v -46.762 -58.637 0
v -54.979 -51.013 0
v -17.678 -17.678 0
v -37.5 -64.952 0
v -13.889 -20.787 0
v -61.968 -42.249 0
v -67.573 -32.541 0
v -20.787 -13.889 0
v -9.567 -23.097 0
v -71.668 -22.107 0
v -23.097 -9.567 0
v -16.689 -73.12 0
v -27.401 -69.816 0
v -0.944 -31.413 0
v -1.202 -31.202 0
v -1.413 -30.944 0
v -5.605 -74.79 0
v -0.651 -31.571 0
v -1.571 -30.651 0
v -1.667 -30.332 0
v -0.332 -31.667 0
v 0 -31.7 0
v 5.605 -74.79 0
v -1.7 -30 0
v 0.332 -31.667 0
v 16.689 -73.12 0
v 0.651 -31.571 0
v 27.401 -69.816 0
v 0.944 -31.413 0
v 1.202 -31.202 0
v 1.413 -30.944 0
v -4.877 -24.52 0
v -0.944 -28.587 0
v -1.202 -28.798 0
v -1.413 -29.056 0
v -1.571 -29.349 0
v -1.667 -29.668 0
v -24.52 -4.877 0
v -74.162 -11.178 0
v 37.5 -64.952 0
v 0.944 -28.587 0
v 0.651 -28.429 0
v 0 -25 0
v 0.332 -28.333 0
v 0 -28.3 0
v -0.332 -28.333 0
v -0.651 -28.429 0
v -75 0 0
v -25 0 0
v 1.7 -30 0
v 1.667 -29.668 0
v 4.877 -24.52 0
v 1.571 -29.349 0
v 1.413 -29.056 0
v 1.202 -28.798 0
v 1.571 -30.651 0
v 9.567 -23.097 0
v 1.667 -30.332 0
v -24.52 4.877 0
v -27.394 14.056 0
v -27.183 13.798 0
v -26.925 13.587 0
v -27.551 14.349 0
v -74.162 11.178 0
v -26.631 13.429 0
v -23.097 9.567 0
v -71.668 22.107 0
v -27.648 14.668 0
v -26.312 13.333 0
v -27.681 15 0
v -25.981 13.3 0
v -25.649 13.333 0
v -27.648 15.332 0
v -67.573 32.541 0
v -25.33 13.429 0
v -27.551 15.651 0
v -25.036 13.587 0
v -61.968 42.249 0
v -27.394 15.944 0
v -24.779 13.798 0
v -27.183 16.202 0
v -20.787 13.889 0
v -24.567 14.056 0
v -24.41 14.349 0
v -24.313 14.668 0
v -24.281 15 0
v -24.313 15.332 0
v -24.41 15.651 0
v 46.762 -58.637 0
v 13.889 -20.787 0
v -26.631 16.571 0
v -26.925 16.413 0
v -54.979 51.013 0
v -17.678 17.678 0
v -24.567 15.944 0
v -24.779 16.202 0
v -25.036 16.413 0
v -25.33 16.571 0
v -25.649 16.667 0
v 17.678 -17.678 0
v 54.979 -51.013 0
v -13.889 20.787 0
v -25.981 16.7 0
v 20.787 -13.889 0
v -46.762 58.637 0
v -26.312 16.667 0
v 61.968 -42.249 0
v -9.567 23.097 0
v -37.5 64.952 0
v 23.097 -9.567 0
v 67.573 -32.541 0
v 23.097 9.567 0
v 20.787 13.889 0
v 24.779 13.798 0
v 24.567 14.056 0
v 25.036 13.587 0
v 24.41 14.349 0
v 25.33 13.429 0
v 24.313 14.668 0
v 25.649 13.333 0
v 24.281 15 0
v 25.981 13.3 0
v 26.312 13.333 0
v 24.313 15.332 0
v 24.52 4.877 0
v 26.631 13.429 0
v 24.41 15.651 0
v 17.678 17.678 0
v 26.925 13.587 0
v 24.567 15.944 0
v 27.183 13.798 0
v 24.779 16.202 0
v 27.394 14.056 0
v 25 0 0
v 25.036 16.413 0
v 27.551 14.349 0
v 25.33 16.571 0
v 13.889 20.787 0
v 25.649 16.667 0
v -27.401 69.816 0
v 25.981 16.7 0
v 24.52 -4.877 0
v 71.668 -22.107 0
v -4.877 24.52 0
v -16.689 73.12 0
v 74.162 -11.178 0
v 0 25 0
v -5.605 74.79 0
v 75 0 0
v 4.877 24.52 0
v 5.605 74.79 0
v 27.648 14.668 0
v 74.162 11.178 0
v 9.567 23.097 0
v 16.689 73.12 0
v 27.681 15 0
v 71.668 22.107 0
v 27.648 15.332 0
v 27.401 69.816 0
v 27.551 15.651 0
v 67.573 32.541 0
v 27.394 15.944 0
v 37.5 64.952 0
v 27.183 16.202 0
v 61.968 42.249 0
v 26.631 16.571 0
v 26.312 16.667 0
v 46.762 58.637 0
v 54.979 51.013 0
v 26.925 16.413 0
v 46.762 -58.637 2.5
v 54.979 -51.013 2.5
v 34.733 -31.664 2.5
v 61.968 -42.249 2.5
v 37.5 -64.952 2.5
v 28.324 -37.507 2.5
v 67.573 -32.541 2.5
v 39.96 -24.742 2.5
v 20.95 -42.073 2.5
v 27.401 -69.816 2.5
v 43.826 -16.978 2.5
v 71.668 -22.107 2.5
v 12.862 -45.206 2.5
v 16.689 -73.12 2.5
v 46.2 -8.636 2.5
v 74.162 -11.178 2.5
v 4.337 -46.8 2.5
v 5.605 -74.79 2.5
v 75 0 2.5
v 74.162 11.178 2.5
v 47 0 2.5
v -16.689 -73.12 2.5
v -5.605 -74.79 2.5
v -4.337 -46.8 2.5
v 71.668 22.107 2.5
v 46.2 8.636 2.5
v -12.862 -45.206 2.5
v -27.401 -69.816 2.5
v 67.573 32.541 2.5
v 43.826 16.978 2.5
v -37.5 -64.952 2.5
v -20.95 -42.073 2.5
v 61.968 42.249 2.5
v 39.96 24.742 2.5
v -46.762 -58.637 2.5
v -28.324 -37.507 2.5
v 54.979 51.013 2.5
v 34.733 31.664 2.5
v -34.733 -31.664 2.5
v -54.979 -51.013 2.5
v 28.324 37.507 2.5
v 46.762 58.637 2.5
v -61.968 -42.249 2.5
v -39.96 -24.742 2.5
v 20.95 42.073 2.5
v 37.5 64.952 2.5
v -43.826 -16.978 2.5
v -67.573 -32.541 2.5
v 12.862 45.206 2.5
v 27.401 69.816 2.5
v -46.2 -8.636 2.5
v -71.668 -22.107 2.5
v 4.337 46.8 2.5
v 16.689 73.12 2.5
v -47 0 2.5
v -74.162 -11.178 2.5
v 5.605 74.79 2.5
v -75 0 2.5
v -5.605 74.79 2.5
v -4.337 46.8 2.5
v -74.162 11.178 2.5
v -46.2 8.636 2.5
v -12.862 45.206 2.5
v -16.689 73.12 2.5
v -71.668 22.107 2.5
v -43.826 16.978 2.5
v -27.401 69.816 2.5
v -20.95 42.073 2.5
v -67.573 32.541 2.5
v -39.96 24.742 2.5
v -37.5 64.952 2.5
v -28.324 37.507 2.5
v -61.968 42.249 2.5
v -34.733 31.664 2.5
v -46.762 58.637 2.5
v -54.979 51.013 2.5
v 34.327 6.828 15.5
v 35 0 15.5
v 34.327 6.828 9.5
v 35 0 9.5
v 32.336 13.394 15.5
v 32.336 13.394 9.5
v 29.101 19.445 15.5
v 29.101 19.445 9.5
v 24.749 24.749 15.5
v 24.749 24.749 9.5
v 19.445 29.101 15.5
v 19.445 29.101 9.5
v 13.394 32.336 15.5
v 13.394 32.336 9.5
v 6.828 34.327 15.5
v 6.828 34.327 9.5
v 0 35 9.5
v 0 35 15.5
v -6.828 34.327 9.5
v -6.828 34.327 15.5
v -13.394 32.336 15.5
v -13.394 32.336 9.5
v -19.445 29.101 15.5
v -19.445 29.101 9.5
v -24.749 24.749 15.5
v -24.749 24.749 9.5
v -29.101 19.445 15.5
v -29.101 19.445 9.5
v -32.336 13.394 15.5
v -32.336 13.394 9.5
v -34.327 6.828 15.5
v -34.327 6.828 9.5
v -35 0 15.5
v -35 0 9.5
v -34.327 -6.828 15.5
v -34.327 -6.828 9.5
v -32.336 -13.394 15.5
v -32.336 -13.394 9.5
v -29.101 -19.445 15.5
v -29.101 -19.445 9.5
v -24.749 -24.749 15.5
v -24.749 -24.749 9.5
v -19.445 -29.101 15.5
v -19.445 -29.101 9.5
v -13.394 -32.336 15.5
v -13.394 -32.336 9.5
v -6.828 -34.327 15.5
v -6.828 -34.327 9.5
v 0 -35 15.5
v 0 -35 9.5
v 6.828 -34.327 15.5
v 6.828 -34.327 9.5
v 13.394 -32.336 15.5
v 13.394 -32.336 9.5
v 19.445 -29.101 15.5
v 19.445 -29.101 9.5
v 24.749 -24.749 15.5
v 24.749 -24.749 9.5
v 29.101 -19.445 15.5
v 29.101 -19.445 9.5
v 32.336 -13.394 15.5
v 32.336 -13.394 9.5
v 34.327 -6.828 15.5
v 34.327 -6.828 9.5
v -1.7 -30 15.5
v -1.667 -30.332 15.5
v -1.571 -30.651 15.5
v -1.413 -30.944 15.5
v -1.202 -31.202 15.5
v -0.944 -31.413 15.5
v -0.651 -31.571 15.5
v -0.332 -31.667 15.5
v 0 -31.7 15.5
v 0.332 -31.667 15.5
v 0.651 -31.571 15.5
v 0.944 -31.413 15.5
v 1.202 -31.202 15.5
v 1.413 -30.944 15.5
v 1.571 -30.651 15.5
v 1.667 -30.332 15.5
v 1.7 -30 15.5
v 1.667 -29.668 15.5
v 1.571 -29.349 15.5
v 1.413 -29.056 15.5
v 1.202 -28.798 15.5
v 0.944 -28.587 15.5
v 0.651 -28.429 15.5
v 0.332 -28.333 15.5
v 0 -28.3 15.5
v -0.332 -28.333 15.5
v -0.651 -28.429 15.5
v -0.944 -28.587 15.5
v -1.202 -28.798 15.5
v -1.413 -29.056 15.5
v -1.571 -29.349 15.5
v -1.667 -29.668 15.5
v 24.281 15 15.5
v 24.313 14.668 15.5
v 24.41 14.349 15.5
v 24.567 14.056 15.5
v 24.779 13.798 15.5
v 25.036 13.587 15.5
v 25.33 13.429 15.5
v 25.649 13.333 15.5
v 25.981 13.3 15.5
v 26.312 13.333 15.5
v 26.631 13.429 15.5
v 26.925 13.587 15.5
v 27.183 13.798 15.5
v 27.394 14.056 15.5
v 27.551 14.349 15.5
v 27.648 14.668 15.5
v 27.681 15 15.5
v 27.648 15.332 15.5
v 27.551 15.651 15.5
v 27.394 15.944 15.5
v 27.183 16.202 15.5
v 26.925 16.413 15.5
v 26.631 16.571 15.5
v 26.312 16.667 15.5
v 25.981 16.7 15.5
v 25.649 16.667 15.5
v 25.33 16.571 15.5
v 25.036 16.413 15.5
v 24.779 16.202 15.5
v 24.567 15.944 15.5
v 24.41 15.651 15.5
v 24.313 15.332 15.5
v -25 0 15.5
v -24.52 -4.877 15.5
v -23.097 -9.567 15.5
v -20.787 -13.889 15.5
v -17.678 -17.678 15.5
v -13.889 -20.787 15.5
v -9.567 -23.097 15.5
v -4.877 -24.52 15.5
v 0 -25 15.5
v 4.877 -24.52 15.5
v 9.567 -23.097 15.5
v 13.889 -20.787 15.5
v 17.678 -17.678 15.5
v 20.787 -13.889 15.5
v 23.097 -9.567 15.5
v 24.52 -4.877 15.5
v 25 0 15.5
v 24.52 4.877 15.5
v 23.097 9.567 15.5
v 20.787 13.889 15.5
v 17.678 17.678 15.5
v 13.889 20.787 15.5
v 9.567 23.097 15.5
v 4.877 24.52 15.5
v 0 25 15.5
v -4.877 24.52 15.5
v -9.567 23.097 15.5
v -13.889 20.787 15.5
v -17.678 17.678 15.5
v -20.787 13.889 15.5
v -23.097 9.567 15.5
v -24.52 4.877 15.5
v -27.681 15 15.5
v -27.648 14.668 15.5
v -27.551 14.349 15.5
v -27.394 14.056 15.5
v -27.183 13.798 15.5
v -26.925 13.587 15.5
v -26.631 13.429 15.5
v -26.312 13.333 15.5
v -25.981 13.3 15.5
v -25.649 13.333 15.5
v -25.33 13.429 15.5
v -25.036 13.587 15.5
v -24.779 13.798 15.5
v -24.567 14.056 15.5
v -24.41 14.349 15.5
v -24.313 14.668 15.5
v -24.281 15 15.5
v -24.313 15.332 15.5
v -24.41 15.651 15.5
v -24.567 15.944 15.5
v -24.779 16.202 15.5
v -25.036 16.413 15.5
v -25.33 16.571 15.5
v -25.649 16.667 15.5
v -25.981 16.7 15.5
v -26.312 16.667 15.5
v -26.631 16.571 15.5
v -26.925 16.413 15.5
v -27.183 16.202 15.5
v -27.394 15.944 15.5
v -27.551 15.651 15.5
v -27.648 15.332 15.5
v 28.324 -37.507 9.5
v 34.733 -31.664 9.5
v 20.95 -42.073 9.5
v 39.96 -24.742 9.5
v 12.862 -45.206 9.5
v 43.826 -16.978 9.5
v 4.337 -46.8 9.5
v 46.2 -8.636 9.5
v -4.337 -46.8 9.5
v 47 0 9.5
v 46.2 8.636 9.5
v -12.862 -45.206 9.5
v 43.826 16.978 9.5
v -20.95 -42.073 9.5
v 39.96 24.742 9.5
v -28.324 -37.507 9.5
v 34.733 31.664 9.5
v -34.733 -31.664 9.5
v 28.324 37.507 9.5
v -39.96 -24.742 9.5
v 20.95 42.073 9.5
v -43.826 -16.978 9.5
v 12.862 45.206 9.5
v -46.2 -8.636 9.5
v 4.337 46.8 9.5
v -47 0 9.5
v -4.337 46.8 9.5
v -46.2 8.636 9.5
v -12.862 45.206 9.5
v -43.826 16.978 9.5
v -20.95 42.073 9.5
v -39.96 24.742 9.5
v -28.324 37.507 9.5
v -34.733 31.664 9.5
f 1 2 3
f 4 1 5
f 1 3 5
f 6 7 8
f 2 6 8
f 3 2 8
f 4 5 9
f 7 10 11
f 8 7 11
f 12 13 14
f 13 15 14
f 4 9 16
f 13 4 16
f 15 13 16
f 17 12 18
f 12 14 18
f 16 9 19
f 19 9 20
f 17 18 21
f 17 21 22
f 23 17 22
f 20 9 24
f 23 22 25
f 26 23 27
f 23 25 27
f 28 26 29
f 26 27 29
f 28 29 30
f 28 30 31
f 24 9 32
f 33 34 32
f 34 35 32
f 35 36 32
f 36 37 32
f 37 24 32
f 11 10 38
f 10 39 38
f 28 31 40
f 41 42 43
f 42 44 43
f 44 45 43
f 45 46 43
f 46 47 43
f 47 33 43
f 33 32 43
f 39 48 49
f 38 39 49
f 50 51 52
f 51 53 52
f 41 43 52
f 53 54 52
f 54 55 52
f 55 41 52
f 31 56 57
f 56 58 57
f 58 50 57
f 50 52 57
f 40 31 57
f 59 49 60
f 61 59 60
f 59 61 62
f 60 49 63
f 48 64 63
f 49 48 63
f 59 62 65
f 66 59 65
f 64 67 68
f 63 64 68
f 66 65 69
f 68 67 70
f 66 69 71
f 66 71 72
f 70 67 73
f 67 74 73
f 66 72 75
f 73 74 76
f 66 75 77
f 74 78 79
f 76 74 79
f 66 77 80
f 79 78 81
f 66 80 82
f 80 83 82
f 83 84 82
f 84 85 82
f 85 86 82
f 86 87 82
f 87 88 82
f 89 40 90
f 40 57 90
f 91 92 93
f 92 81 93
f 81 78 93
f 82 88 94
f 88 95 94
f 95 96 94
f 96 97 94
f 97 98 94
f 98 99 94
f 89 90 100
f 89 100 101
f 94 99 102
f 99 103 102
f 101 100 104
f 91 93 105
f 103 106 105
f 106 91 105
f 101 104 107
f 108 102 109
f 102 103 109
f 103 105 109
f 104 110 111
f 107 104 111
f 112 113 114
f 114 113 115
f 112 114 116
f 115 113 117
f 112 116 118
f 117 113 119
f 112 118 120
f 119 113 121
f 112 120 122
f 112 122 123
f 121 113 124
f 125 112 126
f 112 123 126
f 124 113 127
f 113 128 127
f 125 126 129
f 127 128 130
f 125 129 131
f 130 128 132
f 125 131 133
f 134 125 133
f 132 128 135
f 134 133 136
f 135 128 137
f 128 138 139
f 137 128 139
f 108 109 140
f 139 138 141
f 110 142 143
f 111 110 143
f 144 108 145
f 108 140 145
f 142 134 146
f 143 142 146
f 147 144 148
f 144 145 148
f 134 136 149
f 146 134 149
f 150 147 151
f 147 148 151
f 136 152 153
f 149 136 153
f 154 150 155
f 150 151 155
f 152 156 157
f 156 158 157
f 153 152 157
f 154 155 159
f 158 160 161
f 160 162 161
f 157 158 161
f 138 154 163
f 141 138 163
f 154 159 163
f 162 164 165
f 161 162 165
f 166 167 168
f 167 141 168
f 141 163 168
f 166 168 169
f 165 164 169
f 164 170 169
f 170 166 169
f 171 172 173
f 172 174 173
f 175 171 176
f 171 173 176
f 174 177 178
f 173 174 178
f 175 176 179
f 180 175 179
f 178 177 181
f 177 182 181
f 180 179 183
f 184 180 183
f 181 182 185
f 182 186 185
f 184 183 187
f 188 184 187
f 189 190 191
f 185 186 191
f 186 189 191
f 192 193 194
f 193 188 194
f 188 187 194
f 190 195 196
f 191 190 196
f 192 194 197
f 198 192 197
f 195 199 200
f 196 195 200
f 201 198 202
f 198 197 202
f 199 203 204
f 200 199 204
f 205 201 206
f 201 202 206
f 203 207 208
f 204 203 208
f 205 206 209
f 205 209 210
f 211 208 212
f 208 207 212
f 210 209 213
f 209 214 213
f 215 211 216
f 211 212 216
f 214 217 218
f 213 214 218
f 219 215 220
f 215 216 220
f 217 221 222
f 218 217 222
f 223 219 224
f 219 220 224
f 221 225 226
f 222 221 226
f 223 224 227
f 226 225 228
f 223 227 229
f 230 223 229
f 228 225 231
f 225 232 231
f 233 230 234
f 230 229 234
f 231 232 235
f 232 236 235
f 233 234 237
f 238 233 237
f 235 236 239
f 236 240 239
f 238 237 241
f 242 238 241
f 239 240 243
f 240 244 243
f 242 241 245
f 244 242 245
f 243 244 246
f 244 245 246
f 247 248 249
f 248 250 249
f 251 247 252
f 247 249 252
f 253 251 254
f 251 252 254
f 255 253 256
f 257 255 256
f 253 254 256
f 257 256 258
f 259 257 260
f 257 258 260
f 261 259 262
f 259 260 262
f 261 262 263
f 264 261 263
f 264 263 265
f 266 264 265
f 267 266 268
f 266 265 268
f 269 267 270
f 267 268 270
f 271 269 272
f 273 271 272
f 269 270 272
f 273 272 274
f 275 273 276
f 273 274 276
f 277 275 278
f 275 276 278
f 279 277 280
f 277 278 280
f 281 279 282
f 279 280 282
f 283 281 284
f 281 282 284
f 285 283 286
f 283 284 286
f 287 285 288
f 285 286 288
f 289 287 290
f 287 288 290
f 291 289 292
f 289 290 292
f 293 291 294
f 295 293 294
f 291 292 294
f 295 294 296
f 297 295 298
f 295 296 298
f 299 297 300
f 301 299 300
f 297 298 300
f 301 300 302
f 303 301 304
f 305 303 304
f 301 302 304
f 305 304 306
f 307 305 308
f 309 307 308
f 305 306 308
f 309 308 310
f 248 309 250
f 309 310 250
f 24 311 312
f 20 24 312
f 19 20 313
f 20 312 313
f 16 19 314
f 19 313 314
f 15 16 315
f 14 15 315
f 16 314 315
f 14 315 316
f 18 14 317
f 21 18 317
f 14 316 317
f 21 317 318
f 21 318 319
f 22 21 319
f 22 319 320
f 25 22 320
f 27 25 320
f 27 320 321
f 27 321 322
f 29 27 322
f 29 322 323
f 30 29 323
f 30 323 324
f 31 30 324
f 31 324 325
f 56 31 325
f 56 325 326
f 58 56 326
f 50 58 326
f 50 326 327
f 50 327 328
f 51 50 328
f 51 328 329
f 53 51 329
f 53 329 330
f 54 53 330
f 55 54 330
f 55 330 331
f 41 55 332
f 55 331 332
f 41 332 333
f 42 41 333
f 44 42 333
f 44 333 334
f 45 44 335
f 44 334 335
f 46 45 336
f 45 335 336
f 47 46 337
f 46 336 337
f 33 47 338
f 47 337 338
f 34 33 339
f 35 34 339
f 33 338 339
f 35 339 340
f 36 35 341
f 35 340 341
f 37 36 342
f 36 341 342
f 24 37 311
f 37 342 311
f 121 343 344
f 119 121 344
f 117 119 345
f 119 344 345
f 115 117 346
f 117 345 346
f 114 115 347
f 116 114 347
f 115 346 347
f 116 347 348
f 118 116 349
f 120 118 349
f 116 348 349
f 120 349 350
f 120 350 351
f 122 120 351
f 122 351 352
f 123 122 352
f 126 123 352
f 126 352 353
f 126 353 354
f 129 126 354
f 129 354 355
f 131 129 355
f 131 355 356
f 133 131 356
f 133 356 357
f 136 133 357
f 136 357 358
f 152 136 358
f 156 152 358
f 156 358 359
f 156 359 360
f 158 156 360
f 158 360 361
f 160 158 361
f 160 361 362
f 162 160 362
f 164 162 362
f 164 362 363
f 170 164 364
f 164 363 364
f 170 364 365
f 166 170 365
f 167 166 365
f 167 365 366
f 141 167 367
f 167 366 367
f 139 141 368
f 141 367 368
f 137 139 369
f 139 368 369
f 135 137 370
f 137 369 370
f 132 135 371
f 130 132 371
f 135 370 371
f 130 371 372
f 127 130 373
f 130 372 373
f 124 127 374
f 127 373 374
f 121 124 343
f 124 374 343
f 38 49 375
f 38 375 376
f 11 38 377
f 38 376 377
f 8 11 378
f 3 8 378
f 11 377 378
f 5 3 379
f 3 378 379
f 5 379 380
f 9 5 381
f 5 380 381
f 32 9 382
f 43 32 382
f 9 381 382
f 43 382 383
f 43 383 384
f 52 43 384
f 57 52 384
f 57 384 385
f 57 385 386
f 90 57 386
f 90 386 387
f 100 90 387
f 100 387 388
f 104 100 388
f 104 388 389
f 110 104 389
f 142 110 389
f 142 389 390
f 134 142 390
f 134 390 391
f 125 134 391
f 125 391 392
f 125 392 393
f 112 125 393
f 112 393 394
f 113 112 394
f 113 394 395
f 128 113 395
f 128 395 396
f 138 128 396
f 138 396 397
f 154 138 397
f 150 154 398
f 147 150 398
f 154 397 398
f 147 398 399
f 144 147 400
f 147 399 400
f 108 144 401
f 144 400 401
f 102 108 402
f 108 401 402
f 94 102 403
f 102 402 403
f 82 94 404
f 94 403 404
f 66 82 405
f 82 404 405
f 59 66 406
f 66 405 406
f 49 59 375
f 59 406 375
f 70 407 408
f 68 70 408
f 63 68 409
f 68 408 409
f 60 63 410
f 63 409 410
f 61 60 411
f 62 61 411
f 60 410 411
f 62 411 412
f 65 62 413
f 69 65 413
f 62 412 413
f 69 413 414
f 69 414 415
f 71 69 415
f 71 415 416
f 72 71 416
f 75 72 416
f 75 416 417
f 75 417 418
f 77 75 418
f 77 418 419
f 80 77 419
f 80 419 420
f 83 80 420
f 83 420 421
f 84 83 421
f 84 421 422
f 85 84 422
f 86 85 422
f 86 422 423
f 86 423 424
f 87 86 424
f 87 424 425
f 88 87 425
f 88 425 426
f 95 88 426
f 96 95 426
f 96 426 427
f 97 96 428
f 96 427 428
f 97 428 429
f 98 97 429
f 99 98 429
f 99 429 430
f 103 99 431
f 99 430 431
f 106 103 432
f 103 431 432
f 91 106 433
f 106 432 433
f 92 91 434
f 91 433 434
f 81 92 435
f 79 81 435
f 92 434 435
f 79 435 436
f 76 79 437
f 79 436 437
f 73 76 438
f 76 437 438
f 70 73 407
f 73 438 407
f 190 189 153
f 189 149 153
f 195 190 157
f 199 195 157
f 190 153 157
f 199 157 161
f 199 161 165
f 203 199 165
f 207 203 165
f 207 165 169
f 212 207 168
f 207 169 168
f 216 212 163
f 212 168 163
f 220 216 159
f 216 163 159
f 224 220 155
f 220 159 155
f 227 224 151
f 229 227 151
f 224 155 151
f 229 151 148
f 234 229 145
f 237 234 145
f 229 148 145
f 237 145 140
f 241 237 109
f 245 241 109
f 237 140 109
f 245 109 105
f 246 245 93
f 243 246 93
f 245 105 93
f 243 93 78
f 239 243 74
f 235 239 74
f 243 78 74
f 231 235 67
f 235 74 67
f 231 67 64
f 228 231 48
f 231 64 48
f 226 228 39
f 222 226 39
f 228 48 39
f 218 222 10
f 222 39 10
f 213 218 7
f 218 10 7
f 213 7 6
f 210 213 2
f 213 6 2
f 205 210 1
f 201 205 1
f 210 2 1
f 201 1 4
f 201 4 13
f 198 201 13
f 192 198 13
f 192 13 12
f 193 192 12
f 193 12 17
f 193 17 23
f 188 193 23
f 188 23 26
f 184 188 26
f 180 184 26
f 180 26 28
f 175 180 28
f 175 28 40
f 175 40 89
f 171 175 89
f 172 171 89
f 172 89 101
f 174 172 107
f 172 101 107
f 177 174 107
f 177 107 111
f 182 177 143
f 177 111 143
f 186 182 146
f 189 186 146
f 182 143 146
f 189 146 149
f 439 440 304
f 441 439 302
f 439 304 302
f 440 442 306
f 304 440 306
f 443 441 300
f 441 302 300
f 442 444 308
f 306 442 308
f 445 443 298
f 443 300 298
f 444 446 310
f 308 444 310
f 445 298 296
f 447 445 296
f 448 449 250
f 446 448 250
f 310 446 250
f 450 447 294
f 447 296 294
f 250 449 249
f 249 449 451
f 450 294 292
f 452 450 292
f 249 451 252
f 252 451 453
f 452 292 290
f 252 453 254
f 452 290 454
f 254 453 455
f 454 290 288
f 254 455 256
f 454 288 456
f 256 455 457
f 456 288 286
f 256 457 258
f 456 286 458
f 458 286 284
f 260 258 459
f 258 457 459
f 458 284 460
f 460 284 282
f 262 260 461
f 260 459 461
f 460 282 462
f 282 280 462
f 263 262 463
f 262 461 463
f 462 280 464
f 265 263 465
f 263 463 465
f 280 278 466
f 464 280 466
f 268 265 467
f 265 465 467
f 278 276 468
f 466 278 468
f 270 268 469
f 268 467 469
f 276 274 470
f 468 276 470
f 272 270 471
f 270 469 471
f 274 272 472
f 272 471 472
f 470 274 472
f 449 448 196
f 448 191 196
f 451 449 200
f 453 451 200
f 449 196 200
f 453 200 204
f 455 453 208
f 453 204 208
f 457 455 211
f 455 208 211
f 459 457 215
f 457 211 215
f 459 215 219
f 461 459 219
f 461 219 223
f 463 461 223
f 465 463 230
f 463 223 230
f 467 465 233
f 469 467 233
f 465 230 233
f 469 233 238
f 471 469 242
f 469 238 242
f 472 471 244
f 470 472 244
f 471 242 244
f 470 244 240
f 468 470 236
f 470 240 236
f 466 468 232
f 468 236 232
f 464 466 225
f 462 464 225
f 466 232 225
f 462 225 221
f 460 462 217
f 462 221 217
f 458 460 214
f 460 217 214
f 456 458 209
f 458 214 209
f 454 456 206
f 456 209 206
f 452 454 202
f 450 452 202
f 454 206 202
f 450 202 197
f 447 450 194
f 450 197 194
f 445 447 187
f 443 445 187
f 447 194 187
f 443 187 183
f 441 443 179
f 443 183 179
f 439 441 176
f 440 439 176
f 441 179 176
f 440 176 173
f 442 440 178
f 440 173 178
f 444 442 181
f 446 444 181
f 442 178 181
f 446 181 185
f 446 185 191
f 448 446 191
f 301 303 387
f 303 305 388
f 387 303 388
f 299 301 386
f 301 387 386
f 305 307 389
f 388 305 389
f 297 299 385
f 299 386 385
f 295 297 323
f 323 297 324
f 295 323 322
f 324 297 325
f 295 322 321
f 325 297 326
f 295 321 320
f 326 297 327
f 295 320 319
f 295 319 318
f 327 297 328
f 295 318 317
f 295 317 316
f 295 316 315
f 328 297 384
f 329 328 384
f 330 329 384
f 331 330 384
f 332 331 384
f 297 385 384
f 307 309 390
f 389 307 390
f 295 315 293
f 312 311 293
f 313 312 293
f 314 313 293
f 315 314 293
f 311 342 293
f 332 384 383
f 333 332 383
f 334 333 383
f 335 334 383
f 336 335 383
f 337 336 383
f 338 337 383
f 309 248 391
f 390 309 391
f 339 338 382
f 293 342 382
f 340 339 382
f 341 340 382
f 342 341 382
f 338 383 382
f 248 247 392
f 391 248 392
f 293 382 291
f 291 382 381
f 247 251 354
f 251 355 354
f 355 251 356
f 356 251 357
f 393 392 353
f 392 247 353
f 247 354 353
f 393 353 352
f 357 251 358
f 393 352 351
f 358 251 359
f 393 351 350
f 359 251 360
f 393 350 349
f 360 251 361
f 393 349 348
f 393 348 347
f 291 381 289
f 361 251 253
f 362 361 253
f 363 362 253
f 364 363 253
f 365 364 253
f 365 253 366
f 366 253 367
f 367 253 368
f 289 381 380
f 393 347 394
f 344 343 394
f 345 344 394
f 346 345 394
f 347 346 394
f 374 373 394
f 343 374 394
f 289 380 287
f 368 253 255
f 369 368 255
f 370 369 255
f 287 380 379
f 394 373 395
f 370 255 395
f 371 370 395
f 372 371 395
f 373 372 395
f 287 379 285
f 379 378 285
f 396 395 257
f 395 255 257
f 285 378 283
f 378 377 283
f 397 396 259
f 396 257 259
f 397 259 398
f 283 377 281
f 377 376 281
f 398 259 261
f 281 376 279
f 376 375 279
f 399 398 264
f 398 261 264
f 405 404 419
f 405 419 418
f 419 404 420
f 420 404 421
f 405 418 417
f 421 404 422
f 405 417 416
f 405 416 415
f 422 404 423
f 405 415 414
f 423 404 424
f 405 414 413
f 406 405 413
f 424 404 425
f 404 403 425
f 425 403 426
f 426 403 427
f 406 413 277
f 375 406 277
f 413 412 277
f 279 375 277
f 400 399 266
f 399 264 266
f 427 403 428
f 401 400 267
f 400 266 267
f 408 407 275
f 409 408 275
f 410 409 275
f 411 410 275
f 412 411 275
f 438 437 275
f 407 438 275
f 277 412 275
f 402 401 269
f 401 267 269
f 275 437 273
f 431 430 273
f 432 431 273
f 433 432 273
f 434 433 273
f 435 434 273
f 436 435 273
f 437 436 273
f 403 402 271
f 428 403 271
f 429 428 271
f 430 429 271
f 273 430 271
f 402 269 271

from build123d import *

# Parameters (mm, degrees)
SKETCH001_R   = 25
SKETCH001_R_2 = 1.7
POCKET_DEPTH  = 15.501


with BuildPart() as part:
    # Sketch → Revolution (revolve)
    with BuildSketch(Plane.XZ):
        Polygon((0, 15.5), (35, 15.5), (35, 9.5), (47, 9.5), (47, 2.5), (75, 2.5), (75, 0), (0, 0), align=None)
    revolve(axis=Axis((0, 0, 0), (0, 0, 1)))

    # Sketch001 → Pocket (cut, through all)
    with BuildSketch(Plane(origin=(0, 0, 15.5), x_dir=(-1, 0, 0), z_dir=(0, 0, 1))):
        Circle(SKETCH001_R)
        with Locations((0, 30)):
            Circle(SKETCH001_R_2)
        with Locations((25.980762, -15)):
            Circle(SKETCH001_R_2)
        with Locations((-25.980762, -15)):
            Circle(SKETCH001_R_2)
    extrude(amount=-POCKET_DEPTH, mode=Mode.SUBTRACT)


solid = part.part
